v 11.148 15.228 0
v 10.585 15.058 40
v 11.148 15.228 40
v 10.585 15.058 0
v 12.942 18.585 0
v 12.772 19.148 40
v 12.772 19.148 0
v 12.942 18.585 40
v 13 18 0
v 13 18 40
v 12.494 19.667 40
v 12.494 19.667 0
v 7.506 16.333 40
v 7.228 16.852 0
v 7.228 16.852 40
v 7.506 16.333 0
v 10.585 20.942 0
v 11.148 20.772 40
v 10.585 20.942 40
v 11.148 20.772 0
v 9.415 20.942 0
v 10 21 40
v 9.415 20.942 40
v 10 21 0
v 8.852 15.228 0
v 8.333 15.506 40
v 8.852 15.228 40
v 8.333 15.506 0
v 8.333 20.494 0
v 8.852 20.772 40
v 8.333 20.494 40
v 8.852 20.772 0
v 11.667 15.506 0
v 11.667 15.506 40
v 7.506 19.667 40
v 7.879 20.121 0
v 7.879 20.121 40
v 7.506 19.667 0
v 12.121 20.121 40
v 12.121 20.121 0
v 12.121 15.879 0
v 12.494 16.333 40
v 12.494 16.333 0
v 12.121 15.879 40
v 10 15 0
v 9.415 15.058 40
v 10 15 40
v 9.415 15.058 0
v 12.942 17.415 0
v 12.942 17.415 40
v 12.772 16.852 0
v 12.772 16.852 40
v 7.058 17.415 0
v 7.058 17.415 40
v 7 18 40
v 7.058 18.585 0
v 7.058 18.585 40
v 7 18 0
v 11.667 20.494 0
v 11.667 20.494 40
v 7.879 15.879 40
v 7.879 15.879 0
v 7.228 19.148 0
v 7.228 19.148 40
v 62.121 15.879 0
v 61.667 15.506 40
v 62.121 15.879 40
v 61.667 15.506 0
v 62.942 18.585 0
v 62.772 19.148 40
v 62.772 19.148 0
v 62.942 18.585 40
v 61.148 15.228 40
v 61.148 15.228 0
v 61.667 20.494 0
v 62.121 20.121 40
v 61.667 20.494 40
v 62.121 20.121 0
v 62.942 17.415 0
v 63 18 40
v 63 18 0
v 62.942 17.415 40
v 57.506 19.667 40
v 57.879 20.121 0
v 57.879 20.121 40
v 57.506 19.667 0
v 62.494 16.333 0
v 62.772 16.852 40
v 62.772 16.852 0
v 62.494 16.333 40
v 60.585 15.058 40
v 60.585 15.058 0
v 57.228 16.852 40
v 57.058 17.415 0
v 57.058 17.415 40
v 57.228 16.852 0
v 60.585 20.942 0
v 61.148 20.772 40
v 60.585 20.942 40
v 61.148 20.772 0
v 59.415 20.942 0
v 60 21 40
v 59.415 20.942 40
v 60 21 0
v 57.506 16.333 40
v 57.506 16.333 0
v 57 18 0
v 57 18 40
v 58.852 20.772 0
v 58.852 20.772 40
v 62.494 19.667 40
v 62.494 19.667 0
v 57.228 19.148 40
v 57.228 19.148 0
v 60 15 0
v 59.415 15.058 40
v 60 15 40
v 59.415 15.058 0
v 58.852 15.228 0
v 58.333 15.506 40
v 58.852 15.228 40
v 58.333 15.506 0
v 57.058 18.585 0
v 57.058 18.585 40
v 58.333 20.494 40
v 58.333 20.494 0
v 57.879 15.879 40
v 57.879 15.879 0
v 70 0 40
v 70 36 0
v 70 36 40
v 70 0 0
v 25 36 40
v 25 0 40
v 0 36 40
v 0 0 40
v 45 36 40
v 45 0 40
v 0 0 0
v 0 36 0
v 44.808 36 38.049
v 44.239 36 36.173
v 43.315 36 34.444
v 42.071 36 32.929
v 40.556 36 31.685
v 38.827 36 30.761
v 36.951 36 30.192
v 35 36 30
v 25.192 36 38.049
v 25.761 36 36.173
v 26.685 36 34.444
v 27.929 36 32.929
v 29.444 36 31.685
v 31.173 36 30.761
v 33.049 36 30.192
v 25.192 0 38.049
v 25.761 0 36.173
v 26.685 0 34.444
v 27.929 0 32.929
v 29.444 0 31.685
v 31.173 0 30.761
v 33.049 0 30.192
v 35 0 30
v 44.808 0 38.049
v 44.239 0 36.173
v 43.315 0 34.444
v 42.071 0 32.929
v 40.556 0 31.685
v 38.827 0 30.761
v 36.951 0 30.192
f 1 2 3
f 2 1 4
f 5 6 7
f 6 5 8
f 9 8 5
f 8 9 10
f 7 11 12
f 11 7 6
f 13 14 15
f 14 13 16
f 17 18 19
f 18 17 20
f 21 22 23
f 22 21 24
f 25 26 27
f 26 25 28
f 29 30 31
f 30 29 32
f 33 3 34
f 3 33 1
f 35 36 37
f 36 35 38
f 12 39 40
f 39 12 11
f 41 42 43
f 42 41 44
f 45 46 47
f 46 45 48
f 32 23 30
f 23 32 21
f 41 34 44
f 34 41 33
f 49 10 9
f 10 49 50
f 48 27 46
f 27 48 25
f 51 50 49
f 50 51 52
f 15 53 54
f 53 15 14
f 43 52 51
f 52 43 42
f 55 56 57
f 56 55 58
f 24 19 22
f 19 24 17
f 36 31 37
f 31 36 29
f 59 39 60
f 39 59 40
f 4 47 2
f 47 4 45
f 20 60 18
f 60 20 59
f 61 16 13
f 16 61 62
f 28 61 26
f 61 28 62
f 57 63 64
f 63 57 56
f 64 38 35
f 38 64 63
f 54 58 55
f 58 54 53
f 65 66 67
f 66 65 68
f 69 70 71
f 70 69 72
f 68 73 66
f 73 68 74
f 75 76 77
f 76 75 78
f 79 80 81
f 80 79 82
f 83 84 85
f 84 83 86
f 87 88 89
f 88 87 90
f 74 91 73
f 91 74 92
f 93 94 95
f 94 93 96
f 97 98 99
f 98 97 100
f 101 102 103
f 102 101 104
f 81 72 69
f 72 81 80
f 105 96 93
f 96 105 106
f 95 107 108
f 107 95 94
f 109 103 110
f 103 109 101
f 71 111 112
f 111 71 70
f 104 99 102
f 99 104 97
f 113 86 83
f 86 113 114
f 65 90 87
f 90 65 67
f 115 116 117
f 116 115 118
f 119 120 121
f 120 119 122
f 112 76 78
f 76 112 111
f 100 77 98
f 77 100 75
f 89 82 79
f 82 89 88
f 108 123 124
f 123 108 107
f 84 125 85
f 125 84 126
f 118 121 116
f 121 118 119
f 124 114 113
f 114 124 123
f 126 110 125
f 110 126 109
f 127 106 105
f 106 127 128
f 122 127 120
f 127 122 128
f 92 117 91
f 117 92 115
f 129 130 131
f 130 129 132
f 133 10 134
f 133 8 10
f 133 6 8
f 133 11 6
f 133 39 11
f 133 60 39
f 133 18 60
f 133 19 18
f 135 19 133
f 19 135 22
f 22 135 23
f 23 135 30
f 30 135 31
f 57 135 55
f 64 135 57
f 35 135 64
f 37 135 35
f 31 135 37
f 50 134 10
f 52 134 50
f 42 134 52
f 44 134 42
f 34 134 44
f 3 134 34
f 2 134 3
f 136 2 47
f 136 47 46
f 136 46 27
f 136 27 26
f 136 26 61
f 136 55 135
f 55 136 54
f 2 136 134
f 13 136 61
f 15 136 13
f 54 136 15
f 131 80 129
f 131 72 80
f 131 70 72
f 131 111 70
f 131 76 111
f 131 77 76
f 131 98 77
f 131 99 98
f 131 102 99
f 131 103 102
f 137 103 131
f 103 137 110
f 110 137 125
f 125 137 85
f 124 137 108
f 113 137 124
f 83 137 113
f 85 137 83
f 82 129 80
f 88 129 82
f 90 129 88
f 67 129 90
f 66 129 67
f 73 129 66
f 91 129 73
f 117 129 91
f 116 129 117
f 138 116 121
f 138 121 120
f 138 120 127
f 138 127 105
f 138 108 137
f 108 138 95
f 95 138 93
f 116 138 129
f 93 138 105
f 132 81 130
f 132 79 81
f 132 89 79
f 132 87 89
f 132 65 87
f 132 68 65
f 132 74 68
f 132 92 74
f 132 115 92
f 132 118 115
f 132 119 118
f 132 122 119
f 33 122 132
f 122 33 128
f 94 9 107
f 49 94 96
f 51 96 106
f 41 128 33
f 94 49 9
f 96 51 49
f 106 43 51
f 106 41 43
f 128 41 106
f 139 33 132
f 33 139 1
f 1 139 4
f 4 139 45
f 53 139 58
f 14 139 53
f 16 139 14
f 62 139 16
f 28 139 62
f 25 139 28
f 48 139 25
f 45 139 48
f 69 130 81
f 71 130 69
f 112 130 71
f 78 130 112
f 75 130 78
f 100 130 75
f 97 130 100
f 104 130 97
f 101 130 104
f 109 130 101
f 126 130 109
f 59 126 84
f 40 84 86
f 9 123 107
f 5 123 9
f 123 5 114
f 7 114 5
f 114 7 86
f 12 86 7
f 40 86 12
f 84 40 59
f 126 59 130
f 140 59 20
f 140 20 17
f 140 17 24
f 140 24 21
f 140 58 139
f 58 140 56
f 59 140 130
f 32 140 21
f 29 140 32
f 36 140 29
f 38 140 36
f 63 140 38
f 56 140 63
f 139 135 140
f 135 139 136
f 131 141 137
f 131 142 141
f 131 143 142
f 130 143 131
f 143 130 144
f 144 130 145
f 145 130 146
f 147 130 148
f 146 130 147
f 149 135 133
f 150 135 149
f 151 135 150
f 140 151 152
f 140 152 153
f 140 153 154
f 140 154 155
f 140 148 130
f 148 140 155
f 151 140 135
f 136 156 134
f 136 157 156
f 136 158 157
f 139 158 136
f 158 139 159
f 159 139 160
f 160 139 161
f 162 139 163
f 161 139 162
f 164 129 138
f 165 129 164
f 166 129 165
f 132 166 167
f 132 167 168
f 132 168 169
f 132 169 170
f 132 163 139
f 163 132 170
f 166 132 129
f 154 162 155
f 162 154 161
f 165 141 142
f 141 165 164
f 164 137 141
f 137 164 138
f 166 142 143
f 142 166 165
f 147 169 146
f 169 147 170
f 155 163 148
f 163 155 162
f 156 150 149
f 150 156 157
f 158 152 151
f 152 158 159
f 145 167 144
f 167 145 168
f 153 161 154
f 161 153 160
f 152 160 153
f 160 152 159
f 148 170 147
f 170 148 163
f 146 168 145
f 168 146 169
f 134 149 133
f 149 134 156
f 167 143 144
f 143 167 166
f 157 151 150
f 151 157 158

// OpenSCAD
$fn = 32;

// ----------------------------------------------------------------------
// Saddle clamp: plain shaft clamp
// ----------------------------------------------------------------------

// --- parameters (mm) ---
blk_l = 70;               // block length, X
blk_w = 36;               // block width, Y
blk_h = 40;               // block height
clamp_r = 10;             // shaft groove radius
hole_r = 3;               // bolt hole radius
hole_m = 10;              // bolt hole margin from the ends

saw_depth = clamp_r + 3;  // saw kerf depth

difference() {
  cube([blk_l, blk_w, blk_h]);
  translate([blk_l / 2, -1, blk_h])
    rotate([-90, 0, 0])
      cylinder(h = blk_w + 2, r = clamp_r);
  for (sx = [0, 1])
    translate([sx ? blk_l - hole_m : hole_m, blk_w / 2, -1])
      cylinder(r = hole_r, h = blk_h + 2);
}
